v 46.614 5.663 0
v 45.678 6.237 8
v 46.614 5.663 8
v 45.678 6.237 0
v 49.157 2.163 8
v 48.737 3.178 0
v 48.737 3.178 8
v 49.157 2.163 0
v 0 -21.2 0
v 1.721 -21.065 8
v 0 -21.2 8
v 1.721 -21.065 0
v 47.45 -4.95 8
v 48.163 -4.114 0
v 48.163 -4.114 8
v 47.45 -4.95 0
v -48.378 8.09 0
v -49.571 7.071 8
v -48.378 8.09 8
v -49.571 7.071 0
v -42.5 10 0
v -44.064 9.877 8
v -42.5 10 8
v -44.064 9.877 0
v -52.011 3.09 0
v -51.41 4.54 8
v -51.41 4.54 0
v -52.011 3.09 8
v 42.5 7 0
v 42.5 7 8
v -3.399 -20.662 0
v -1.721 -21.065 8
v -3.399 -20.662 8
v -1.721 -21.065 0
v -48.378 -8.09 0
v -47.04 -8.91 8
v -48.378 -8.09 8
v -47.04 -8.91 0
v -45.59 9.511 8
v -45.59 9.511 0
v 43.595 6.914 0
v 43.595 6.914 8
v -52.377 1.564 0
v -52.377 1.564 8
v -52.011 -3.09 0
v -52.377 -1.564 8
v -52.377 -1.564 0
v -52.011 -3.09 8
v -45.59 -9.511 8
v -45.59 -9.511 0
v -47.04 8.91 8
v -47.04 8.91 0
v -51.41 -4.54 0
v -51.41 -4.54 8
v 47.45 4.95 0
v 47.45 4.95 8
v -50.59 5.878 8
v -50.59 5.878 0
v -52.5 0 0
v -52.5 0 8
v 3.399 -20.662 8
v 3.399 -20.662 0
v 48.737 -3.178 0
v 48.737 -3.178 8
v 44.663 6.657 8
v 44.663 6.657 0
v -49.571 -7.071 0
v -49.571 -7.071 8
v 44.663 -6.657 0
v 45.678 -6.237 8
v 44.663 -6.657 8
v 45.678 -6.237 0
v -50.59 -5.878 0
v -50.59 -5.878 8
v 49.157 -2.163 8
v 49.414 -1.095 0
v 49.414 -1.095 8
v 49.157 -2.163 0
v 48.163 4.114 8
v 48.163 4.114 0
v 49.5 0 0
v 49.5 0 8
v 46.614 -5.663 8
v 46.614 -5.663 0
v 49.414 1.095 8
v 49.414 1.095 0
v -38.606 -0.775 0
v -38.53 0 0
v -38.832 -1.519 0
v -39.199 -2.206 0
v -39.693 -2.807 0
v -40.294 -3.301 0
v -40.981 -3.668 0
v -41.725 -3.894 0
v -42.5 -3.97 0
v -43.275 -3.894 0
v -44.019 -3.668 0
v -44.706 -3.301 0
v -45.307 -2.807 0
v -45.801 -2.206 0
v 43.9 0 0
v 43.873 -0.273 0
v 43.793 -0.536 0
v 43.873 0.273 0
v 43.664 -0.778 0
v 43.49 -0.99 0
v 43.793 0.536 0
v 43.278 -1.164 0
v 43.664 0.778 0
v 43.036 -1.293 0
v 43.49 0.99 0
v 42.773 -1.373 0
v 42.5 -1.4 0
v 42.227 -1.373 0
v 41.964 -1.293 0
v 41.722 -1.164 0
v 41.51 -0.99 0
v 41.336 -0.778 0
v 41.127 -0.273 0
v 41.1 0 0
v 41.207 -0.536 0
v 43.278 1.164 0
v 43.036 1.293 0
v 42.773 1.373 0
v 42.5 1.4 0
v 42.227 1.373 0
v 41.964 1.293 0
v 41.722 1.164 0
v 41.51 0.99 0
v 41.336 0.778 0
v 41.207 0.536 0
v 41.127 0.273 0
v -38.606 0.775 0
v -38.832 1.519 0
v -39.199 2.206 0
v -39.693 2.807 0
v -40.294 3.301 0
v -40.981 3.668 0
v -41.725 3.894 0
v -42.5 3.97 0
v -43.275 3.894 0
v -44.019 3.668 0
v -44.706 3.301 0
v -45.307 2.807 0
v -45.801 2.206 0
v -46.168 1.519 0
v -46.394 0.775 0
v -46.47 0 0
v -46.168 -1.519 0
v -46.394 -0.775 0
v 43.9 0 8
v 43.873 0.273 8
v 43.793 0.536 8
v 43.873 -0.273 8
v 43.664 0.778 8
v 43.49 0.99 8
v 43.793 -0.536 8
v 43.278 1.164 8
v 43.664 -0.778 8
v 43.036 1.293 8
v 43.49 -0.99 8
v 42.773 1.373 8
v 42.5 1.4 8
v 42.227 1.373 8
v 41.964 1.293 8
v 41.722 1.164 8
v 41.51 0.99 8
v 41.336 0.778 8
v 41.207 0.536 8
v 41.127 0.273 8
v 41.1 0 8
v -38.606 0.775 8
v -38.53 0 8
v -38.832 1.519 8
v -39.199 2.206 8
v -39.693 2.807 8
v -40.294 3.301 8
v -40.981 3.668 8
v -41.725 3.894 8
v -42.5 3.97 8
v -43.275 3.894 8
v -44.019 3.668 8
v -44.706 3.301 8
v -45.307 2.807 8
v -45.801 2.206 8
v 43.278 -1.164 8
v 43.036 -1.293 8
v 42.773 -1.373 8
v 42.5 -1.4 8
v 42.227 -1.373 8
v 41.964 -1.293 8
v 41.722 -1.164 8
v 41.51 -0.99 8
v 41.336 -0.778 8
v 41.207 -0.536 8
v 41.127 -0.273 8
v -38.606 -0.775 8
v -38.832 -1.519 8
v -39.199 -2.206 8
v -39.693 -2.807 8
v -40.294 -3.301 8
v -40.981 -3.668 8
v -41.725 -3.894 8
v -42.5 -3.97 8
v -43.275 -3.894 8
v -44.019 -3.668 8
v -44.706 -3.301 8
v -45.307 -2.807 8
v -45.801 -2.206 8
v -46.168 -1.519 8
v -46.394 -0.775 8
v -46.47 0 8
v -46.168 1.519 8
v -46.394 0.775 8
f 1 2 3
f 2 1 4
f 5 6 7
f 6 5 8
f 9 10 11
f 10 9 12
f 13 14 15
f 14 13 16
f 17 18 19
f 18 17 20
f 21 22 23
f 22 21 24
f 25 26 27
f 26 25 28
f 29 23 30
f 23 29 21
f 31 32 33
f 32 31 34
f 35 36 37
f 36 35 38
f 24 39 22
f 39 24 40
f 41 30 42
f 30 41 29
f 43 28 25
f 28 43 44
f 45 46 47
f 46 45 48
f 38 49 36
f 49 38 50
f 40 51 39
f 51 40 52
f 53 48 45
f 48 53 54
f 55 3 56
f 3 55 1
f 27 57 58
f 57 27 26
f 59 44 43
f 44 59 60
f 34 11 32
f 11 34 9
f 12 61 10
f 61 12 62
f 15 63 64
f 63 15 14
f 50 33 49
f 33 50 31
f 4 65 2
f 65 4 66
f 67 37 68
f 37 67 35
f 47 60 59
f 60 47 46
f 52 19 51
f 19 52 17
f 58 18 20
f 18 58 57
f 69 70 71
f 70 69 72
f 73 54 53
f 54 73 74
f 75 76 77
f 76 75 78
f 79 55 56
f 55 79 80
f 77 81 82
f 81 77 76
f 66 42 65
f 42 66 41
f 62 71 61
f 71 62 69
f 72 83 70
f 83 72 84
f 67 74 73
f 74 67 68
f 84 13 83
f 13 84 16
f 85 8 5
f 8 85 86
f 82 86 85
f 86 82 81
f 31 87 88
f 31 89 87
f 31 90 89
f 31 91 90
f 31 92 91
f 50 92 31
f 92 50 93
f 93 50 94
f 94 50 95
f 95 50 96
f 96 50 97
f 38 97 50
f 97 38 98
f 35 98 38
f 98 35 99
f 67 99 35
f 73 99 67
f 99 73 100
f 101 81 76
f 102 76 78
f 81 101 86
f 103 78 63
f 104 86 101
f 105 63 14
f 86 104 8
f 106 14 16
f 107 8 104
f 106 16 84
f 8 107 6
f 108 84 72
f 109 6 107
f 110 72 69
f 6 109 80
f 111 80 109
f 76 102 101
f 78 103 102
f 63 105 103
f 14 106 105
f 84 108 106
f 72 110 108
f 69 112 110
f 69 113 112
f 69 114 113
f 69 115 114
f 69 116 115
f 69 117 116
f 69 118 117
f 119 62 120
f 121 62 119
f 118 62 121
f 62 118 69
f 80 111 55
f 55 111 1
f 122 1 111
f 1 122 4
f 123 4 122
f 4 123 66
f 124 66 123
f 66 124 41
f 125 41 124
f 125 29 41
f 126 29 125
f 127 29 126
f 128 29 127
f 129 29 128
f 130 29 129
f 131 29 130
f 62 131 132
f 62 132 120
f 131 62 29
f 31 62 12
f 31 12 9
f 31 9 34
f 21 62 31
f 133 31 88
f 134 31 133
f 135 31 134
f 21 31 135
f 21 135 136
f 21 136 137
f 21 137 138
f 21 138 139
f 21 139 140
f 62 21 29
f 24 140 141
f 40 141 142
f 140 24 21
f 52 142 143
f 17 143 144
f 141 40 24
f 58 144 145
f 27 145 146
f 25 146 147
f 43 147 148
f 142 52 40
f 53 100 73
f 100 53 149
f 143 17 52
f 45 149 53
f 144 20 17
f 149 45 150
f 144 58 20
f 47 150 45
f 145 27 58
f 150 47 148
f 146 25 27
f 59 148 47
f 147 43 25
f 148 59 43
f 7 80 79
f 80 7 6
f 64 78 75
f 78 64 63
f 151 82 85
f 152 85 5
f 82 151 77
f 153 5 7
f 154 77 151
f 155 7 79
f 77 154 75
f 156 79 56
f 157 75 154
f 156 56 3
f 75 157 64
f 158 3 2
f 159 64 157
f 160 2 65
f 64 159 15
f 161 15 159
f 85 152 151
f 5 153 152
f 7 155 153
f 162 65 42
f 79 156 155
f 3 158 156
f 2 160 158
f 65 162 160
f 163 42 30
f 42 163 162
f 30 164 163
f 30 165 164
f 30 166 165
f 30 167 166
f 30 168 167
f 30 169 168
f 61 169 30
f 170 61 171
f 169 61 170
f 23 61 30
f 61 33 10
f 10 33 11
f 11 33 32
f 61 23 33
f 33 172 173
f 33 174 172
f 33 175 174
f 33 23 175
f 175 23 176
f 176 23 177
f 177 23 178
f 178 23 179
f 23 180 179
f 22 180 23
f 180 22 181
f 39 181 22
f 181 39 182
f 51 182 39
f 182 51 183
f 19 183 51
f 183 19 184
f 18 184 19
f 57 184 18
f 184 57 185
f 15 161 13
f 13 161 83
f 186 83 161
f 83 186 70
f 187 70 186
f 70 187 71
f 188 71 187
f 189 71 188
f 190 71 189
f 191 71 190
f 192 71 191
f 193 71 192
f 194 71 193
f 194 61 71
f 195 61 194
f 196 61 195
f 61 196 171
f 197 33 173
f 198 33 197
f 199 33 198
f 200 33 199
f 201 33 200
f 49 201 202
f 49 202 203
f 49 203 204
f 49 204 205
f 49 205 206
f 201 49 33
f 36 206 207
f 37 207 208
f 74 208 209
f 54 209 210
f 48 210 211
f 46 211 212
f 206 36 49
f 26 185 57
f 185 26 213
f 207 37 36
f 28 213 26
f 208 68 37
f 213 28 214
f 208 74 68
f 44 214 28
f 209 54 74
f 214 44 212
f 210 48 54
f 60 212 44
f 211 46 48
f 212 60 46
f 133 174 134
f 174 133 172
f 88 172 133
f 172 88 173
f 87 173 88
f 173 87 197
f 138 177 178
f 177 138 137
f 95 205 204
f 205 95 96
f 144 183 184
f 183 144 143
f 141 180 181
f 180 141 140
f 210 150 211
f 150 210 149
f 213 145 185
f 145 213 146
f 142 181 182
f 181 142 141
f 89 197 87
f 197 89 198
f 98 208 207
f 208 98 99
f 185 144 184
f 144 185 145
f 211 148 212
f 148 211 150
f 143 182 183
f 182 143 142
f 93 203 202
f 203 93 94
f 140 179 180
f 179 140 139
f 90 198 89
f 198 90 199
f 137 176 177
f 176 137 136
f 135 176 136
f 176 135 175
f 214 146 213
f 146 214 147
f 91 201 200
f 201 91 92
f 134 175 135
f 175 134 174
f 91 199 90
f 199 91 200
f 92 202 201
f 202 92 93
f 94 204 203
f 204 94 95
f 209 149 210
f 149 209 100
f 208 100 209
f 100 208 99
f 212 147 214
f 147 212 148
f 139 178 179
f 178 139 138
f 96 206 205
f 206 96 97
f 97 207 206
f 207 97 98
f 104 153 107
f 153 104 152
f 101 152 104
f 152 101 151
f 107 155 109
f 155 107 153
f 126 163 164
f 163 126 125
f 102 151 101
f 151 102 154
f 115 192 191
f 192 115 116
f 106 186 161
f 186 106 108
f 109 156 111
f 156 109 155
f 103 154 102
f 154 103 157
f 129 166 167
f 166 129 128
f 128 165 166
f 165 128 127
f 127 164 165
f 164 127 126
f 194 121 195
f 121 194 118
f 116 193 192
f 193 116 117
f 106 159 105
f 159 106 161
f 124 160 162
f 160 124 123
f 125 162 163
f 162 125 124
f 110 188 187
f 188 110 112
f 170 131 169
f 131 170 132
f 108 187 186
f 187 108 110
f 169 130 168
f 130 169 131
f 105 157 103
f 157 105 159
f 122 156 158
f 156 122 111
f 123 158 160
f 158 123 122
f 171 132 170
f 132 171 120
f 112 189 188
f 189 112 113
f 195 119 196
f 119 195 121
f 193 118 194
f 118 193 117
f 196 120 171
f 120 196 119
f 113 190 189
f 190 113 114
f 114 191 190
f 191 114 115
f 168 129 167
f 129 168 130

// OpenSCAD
$fn = 32;

// ----------------------------------------------------------------------
// Lever: 85 mm between the bosses, 8 mm thick, smooth outline
// ----------------------------------------------------------------------

// --- parameters (mm) ---
lever_l = 85;             // distance between the boss centres
boss_a = 20;              // first boss diameter
boss_b = 14;              // second boss diameter
bore_a = 7.94;            // first bore
bore_b = 2.8;             // second bore
lever_t = 8;              // lever thickness
boss_c = 22;              // middle boss diameter
bend = 10.2;              // how far the middle boss drops

lever_profile = [[-52.5, 0], [-52.377, -1.564], [-52.011, -3.09], [-51.41, -4.54], [-50.59, -5.878], [-49.571, -7.071], [-48.378, -8.09], [-47.04, -8.91], [-45.59, -9.511], [-3.399, -20.662], [-1.721, -21.065], [0, -21.2], [1.721, -21.065], [3.399, -20.662], [44.663, -6.657], [45.678, -6.237], [46.614, -5.663], [47.45, -4.95], [48.163, -4.114], [48.737, -3.178], [49.157, -2.163], [49.414, -1.095], [49.5, 0], [49.414, 1.095], [49.157, 2.163], [48.737, 3.178], [48.163, 4.114], [47.45, 4.95], [46.614, 5.663], [45.678, 6.237], [44.663, 6.657], [43.595, 6.914], [42.5, 7], [-42.5, 10], [-44.064, 9.877], [-45.59, 9.511], [-47.04, 8.91], [-48.378, 8.09], [-49.571, 7.071], [-50.59, 5.878], [-51.41, 4.54], [-52.011, 3.09], [-52.377, 1.564]];

difference() {
  linear_extrude(height = lever_t) polygon(lever_profile);
  translate([-42.5, 0, -2.5]) cylinder(h = lever_t + 5, d = bore_a);
  translate([42.5, 0, -2.5]) cylinder(h = lever_t + 5, d = bore_b);
}
